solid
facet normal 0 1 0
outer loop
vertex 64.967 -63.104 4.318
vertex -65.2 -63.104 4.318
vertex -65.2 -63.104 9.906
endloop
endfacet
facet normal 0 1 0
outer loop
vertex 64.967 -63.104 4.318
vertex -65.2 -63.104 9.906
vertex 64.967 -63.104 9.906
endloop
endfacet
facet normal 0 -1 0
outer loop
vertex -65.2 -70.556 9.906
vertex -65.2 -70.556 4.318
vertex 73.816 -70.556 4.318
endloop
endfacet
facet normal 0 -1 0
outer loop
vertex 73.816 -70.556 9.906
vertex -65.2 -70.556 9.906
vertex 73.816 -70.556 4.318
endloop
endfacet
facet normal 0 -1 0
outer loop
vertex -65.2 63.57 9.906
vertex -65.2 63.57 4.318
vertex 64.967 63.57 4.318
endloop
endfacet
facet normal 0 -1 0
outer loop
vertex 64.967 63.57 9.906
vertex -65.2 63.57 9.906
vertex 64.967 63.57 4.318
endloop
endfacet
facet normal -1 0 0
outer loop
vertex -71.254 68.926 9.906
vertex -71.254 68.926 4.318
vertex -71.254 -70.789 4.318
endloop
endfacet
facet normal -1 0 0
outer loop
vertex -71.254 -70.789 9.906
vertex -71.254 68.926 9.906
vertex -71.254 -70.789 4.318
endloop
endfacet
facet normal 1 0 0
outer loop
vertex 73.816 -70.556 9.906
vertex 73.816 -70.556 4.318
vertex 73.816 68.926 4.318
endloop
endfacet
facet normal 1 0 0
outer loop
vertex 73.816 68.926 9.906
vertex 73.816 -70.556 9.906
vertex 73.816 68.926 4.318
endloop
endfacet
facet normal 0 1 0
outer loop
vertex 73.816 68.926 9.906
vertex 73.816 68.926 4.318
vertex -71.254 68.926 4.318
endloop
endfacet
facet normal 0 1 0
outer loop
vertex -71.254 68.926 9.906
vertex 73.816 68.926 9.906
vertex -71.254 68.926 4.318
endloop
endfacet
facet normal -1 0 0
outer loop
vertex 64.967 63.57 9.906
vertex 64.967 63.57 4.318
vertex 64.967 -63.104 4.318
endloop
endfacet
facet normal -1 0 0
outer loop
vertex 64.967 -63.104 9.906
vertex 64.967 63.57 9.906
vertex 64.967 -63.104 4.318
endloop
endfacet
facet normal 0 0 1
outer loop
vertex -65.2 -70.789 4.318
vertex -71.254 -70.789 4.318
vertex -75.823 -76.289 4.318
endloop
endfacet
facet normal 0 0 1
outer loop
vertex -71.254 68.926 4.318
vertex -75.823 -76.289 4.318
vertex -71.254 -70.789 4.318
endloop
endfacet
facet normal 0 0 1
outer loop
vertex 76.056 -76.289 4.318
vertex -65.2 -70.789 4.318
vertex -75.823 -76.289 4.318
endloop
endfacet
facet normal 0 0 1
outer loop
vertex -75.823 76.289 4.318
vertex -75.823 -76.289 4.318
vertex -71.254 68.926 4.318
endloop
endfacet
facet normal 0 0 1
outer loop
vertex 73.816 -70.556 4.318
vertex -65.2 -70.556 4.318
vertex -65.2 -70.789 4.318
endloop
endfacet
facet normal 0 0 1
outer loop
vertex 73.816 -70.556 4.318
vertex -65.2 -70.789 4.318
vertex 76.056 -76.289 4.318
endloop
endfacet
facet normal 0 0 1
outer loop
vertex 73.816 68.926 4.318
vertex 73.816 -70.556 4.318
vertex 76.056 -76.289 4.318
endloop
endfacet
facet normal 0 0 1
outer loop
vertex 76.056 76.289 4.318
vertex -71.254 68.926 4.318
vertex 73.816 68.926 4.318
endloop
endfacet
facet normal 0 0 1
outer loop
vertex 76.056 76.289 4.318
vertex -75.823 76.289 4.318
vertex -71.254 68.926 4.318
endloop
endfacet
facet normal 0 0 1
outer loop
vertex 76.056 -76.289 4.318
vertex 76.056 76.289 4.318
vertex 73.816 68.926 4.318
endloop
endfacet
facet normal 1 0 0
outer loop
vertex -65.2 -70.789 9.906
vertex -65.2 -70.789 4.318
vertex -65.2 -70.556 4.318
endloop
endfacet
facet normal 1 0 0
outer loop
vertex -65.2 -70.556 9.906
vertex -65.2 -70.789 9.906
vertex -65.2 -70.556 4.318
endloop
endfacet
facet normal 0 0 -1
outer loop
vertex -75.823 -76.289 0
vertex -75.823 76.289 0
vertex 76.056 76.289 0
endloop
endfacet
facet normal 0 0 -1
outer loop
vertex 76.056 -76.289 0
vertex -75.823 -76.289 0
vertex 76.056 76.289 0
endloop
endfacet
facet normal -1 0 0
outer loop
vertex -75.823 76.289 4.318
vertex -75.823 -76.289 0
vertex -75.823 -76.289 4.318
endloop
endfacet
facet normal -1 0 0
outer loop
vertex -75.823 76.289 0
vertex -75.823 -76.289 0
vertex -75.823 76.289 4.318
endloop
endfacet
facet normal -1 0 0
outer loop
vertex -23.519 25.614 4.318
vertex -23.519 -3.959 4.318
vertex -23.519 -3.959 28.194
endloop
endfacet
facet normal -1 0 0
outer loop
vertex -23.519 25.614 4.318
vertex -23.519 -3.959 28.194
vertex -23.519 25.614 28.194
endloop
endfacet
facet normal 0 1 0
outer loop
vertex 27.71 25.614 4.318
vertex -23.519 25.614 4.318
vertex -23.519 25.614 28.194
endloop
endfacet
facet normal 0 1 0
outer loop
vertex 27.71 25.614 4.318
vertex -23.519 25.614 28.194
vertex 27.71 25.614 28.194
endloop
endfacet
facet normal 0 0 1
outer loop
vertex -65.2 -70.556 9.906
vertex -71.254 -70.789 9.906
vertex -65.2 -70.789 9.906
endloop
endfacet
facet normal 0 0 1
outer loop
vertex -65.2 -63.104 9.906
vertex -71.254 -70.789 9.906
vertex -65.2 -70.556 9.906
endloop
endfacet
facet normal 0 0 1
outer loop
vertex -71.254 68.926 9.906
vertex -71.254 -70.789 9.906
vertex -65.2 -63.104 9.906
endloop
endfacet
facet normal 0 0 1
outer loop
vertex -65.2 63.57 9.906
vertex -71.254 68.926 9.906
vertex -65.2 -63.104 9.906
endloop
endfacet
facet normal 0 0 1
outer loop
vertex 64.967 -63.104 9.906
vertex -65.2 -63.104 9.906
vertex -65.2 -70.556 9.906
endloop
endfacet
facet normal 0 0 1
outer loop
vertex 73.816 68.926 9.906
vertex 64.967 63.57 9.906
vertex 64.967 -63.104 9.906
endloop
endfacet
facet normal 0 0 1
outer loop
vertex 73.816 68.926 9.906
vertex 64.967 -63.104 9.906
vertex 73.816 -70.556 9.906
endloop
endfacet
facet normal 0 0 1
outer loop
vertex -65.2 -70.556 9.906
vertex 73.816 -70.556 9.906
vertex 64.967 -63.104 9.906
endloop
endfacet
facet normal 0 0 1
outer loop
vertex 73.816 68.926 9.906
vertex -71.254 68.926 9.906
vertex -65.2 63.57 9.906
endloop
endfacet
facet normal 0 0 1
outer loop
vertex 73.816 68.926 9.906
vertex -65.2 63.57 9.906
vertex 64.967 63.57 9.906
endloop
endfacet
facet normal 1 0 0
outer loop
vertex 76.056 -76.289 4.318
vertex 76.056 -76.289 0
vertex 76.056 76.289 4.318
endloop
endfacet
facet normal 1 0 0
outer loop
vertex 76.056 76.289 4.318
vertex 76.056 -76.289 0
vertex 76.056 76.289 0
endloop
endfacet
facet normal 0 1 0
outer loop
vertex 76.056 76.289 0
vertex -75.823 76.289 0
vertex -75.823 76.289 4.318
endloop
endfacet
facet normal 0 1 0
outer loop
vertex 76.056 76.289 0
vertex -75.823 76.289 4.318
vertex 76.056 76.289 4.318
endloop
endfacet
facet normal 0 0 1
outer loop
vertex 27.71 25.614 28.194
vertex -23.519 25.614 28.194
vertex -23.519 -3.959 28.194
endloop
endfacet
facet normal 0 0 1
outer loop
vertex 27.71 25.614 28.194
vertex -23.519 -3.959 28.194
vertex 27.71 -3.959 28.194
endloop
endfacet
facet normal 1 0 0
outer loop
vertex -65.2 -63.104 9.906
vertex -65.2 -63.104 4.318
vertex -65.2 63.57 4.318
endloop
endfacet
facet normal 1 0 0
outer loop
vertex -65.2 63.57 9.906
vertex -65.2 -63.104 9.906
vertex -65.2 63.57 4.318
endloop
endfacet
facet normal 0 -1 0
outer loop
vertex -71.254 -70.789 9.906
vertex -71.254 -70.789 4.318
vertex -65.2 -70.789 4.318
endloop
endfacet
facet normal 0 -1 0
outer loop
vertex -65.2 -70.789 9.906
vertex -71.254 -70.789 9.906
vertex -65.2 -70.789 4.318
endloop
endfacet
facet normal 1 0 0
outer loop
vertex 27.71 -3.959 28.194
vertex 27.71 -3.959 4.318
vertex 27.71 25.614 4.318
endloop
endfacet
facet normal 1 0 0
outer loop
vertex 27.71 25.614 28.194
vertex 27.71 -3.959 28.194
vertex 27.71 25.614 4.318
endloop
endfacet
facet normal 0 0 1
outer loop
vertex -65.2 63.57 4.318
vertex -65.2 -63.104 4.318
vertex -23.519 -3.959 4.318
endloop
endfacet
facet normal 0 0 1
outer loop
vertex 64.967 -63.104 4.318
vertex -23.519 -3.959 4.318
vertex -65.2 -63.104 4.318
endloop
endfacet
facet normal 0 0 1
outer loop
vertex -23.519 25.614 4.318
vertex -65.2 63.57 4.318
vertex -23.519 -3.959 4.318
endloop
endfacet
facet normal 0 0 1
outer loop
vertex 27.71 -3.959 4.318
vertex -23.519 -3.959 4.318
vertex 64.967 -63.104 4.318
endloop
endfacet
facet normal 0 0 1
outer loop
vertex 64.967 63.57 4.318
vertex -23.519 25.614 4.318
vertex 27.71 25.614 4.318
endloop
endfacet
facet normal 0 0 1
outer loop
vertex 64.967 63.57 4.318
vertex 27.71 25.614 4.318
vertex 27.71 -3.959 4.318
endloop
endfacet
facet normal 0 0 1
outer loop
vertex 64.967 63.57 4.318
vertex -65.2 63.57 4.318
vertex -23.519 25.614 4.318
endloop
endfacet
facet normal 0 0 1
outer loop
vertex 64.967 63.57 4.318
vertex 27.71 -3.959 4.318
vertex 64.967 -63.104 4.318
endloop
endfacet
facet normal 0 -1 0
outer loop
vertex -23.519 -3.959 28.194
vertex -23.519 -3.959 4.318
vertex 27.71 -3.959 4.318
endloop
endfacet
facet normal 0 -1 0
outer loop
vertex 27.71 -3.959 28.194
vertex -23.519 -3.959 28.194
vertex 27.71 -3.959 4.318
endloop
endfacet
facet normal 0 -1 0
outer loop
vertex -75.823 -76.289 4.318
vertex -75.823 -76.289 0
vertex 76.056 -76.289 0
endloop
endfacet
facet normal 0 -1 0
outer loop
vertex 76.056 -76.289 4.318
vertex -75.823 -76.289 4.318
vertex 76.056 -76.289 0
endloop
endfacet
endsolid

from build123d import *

# Parameters (mm, degrees)
F0_W     = 151.8794447184
F0_H     = 152.5772064924
F1_DEPTH = 4.318
F2_W     = 130.1674246788
F2_H     = 5.3557232022
F2_H_2   = 7.4514448643
F3_DEPTH = 5.588
F4_W     = 51.2286853045
F4_H     = 29.5729218051
F5_DEPTH = 23.876


with BuildPart() as f1:
    # F0 (on Top) → F1 (new body)
    with BuildSketch(Plane.XY):
        with Locations((0.1162961125, 0)):
            Rectangle(F0_W, F0_H)
    extrude(amount=F1_DEPTH)

    # F2 (on face) → F3 (join)
    with BuildSketch(Plane.XY.offset(4.318)):
        Polygon((-65.2001425624, 63.5701417923), (-65.2001425624, 68.9258649945), (-71.2544471025, 68.9258649945), (-71.2544471025, -70.7887262106), (-65.2001425624, -70.7887262106), (-65.2001425624, -70.5558732152), (-65.2001425624, -63.1044283509), align=None)
        with Locations((-0.116430223, 66.2480033934)):
            Rectangle(F2_W, F2_H)
        Polygon((73.8158747554, 68.9258649945), (64.9672821164, 68.9258649945), (64.9672821164, 63.5701417923), (64.9672821164, -63.1044283509), (64.9672821164, -70.5558732152), (73.8158747554, -70.5558732152), align=None)
        with Locations((-0.116430223, -66.8301507831)):
            Rectangle(F2_W, F2_H_2)
    extrude(amount=F3_DEPTH)

    # F4 (on face) → F5 (join)
    with BuildSketch(Plane.XY.offset(4.318)):
        with Locations((2.0957188681, 10.8278808184)):
            Rectangle(F4_W, F4_H)
    extrude(amount=F5_DEPTH)


solid = f1.part
